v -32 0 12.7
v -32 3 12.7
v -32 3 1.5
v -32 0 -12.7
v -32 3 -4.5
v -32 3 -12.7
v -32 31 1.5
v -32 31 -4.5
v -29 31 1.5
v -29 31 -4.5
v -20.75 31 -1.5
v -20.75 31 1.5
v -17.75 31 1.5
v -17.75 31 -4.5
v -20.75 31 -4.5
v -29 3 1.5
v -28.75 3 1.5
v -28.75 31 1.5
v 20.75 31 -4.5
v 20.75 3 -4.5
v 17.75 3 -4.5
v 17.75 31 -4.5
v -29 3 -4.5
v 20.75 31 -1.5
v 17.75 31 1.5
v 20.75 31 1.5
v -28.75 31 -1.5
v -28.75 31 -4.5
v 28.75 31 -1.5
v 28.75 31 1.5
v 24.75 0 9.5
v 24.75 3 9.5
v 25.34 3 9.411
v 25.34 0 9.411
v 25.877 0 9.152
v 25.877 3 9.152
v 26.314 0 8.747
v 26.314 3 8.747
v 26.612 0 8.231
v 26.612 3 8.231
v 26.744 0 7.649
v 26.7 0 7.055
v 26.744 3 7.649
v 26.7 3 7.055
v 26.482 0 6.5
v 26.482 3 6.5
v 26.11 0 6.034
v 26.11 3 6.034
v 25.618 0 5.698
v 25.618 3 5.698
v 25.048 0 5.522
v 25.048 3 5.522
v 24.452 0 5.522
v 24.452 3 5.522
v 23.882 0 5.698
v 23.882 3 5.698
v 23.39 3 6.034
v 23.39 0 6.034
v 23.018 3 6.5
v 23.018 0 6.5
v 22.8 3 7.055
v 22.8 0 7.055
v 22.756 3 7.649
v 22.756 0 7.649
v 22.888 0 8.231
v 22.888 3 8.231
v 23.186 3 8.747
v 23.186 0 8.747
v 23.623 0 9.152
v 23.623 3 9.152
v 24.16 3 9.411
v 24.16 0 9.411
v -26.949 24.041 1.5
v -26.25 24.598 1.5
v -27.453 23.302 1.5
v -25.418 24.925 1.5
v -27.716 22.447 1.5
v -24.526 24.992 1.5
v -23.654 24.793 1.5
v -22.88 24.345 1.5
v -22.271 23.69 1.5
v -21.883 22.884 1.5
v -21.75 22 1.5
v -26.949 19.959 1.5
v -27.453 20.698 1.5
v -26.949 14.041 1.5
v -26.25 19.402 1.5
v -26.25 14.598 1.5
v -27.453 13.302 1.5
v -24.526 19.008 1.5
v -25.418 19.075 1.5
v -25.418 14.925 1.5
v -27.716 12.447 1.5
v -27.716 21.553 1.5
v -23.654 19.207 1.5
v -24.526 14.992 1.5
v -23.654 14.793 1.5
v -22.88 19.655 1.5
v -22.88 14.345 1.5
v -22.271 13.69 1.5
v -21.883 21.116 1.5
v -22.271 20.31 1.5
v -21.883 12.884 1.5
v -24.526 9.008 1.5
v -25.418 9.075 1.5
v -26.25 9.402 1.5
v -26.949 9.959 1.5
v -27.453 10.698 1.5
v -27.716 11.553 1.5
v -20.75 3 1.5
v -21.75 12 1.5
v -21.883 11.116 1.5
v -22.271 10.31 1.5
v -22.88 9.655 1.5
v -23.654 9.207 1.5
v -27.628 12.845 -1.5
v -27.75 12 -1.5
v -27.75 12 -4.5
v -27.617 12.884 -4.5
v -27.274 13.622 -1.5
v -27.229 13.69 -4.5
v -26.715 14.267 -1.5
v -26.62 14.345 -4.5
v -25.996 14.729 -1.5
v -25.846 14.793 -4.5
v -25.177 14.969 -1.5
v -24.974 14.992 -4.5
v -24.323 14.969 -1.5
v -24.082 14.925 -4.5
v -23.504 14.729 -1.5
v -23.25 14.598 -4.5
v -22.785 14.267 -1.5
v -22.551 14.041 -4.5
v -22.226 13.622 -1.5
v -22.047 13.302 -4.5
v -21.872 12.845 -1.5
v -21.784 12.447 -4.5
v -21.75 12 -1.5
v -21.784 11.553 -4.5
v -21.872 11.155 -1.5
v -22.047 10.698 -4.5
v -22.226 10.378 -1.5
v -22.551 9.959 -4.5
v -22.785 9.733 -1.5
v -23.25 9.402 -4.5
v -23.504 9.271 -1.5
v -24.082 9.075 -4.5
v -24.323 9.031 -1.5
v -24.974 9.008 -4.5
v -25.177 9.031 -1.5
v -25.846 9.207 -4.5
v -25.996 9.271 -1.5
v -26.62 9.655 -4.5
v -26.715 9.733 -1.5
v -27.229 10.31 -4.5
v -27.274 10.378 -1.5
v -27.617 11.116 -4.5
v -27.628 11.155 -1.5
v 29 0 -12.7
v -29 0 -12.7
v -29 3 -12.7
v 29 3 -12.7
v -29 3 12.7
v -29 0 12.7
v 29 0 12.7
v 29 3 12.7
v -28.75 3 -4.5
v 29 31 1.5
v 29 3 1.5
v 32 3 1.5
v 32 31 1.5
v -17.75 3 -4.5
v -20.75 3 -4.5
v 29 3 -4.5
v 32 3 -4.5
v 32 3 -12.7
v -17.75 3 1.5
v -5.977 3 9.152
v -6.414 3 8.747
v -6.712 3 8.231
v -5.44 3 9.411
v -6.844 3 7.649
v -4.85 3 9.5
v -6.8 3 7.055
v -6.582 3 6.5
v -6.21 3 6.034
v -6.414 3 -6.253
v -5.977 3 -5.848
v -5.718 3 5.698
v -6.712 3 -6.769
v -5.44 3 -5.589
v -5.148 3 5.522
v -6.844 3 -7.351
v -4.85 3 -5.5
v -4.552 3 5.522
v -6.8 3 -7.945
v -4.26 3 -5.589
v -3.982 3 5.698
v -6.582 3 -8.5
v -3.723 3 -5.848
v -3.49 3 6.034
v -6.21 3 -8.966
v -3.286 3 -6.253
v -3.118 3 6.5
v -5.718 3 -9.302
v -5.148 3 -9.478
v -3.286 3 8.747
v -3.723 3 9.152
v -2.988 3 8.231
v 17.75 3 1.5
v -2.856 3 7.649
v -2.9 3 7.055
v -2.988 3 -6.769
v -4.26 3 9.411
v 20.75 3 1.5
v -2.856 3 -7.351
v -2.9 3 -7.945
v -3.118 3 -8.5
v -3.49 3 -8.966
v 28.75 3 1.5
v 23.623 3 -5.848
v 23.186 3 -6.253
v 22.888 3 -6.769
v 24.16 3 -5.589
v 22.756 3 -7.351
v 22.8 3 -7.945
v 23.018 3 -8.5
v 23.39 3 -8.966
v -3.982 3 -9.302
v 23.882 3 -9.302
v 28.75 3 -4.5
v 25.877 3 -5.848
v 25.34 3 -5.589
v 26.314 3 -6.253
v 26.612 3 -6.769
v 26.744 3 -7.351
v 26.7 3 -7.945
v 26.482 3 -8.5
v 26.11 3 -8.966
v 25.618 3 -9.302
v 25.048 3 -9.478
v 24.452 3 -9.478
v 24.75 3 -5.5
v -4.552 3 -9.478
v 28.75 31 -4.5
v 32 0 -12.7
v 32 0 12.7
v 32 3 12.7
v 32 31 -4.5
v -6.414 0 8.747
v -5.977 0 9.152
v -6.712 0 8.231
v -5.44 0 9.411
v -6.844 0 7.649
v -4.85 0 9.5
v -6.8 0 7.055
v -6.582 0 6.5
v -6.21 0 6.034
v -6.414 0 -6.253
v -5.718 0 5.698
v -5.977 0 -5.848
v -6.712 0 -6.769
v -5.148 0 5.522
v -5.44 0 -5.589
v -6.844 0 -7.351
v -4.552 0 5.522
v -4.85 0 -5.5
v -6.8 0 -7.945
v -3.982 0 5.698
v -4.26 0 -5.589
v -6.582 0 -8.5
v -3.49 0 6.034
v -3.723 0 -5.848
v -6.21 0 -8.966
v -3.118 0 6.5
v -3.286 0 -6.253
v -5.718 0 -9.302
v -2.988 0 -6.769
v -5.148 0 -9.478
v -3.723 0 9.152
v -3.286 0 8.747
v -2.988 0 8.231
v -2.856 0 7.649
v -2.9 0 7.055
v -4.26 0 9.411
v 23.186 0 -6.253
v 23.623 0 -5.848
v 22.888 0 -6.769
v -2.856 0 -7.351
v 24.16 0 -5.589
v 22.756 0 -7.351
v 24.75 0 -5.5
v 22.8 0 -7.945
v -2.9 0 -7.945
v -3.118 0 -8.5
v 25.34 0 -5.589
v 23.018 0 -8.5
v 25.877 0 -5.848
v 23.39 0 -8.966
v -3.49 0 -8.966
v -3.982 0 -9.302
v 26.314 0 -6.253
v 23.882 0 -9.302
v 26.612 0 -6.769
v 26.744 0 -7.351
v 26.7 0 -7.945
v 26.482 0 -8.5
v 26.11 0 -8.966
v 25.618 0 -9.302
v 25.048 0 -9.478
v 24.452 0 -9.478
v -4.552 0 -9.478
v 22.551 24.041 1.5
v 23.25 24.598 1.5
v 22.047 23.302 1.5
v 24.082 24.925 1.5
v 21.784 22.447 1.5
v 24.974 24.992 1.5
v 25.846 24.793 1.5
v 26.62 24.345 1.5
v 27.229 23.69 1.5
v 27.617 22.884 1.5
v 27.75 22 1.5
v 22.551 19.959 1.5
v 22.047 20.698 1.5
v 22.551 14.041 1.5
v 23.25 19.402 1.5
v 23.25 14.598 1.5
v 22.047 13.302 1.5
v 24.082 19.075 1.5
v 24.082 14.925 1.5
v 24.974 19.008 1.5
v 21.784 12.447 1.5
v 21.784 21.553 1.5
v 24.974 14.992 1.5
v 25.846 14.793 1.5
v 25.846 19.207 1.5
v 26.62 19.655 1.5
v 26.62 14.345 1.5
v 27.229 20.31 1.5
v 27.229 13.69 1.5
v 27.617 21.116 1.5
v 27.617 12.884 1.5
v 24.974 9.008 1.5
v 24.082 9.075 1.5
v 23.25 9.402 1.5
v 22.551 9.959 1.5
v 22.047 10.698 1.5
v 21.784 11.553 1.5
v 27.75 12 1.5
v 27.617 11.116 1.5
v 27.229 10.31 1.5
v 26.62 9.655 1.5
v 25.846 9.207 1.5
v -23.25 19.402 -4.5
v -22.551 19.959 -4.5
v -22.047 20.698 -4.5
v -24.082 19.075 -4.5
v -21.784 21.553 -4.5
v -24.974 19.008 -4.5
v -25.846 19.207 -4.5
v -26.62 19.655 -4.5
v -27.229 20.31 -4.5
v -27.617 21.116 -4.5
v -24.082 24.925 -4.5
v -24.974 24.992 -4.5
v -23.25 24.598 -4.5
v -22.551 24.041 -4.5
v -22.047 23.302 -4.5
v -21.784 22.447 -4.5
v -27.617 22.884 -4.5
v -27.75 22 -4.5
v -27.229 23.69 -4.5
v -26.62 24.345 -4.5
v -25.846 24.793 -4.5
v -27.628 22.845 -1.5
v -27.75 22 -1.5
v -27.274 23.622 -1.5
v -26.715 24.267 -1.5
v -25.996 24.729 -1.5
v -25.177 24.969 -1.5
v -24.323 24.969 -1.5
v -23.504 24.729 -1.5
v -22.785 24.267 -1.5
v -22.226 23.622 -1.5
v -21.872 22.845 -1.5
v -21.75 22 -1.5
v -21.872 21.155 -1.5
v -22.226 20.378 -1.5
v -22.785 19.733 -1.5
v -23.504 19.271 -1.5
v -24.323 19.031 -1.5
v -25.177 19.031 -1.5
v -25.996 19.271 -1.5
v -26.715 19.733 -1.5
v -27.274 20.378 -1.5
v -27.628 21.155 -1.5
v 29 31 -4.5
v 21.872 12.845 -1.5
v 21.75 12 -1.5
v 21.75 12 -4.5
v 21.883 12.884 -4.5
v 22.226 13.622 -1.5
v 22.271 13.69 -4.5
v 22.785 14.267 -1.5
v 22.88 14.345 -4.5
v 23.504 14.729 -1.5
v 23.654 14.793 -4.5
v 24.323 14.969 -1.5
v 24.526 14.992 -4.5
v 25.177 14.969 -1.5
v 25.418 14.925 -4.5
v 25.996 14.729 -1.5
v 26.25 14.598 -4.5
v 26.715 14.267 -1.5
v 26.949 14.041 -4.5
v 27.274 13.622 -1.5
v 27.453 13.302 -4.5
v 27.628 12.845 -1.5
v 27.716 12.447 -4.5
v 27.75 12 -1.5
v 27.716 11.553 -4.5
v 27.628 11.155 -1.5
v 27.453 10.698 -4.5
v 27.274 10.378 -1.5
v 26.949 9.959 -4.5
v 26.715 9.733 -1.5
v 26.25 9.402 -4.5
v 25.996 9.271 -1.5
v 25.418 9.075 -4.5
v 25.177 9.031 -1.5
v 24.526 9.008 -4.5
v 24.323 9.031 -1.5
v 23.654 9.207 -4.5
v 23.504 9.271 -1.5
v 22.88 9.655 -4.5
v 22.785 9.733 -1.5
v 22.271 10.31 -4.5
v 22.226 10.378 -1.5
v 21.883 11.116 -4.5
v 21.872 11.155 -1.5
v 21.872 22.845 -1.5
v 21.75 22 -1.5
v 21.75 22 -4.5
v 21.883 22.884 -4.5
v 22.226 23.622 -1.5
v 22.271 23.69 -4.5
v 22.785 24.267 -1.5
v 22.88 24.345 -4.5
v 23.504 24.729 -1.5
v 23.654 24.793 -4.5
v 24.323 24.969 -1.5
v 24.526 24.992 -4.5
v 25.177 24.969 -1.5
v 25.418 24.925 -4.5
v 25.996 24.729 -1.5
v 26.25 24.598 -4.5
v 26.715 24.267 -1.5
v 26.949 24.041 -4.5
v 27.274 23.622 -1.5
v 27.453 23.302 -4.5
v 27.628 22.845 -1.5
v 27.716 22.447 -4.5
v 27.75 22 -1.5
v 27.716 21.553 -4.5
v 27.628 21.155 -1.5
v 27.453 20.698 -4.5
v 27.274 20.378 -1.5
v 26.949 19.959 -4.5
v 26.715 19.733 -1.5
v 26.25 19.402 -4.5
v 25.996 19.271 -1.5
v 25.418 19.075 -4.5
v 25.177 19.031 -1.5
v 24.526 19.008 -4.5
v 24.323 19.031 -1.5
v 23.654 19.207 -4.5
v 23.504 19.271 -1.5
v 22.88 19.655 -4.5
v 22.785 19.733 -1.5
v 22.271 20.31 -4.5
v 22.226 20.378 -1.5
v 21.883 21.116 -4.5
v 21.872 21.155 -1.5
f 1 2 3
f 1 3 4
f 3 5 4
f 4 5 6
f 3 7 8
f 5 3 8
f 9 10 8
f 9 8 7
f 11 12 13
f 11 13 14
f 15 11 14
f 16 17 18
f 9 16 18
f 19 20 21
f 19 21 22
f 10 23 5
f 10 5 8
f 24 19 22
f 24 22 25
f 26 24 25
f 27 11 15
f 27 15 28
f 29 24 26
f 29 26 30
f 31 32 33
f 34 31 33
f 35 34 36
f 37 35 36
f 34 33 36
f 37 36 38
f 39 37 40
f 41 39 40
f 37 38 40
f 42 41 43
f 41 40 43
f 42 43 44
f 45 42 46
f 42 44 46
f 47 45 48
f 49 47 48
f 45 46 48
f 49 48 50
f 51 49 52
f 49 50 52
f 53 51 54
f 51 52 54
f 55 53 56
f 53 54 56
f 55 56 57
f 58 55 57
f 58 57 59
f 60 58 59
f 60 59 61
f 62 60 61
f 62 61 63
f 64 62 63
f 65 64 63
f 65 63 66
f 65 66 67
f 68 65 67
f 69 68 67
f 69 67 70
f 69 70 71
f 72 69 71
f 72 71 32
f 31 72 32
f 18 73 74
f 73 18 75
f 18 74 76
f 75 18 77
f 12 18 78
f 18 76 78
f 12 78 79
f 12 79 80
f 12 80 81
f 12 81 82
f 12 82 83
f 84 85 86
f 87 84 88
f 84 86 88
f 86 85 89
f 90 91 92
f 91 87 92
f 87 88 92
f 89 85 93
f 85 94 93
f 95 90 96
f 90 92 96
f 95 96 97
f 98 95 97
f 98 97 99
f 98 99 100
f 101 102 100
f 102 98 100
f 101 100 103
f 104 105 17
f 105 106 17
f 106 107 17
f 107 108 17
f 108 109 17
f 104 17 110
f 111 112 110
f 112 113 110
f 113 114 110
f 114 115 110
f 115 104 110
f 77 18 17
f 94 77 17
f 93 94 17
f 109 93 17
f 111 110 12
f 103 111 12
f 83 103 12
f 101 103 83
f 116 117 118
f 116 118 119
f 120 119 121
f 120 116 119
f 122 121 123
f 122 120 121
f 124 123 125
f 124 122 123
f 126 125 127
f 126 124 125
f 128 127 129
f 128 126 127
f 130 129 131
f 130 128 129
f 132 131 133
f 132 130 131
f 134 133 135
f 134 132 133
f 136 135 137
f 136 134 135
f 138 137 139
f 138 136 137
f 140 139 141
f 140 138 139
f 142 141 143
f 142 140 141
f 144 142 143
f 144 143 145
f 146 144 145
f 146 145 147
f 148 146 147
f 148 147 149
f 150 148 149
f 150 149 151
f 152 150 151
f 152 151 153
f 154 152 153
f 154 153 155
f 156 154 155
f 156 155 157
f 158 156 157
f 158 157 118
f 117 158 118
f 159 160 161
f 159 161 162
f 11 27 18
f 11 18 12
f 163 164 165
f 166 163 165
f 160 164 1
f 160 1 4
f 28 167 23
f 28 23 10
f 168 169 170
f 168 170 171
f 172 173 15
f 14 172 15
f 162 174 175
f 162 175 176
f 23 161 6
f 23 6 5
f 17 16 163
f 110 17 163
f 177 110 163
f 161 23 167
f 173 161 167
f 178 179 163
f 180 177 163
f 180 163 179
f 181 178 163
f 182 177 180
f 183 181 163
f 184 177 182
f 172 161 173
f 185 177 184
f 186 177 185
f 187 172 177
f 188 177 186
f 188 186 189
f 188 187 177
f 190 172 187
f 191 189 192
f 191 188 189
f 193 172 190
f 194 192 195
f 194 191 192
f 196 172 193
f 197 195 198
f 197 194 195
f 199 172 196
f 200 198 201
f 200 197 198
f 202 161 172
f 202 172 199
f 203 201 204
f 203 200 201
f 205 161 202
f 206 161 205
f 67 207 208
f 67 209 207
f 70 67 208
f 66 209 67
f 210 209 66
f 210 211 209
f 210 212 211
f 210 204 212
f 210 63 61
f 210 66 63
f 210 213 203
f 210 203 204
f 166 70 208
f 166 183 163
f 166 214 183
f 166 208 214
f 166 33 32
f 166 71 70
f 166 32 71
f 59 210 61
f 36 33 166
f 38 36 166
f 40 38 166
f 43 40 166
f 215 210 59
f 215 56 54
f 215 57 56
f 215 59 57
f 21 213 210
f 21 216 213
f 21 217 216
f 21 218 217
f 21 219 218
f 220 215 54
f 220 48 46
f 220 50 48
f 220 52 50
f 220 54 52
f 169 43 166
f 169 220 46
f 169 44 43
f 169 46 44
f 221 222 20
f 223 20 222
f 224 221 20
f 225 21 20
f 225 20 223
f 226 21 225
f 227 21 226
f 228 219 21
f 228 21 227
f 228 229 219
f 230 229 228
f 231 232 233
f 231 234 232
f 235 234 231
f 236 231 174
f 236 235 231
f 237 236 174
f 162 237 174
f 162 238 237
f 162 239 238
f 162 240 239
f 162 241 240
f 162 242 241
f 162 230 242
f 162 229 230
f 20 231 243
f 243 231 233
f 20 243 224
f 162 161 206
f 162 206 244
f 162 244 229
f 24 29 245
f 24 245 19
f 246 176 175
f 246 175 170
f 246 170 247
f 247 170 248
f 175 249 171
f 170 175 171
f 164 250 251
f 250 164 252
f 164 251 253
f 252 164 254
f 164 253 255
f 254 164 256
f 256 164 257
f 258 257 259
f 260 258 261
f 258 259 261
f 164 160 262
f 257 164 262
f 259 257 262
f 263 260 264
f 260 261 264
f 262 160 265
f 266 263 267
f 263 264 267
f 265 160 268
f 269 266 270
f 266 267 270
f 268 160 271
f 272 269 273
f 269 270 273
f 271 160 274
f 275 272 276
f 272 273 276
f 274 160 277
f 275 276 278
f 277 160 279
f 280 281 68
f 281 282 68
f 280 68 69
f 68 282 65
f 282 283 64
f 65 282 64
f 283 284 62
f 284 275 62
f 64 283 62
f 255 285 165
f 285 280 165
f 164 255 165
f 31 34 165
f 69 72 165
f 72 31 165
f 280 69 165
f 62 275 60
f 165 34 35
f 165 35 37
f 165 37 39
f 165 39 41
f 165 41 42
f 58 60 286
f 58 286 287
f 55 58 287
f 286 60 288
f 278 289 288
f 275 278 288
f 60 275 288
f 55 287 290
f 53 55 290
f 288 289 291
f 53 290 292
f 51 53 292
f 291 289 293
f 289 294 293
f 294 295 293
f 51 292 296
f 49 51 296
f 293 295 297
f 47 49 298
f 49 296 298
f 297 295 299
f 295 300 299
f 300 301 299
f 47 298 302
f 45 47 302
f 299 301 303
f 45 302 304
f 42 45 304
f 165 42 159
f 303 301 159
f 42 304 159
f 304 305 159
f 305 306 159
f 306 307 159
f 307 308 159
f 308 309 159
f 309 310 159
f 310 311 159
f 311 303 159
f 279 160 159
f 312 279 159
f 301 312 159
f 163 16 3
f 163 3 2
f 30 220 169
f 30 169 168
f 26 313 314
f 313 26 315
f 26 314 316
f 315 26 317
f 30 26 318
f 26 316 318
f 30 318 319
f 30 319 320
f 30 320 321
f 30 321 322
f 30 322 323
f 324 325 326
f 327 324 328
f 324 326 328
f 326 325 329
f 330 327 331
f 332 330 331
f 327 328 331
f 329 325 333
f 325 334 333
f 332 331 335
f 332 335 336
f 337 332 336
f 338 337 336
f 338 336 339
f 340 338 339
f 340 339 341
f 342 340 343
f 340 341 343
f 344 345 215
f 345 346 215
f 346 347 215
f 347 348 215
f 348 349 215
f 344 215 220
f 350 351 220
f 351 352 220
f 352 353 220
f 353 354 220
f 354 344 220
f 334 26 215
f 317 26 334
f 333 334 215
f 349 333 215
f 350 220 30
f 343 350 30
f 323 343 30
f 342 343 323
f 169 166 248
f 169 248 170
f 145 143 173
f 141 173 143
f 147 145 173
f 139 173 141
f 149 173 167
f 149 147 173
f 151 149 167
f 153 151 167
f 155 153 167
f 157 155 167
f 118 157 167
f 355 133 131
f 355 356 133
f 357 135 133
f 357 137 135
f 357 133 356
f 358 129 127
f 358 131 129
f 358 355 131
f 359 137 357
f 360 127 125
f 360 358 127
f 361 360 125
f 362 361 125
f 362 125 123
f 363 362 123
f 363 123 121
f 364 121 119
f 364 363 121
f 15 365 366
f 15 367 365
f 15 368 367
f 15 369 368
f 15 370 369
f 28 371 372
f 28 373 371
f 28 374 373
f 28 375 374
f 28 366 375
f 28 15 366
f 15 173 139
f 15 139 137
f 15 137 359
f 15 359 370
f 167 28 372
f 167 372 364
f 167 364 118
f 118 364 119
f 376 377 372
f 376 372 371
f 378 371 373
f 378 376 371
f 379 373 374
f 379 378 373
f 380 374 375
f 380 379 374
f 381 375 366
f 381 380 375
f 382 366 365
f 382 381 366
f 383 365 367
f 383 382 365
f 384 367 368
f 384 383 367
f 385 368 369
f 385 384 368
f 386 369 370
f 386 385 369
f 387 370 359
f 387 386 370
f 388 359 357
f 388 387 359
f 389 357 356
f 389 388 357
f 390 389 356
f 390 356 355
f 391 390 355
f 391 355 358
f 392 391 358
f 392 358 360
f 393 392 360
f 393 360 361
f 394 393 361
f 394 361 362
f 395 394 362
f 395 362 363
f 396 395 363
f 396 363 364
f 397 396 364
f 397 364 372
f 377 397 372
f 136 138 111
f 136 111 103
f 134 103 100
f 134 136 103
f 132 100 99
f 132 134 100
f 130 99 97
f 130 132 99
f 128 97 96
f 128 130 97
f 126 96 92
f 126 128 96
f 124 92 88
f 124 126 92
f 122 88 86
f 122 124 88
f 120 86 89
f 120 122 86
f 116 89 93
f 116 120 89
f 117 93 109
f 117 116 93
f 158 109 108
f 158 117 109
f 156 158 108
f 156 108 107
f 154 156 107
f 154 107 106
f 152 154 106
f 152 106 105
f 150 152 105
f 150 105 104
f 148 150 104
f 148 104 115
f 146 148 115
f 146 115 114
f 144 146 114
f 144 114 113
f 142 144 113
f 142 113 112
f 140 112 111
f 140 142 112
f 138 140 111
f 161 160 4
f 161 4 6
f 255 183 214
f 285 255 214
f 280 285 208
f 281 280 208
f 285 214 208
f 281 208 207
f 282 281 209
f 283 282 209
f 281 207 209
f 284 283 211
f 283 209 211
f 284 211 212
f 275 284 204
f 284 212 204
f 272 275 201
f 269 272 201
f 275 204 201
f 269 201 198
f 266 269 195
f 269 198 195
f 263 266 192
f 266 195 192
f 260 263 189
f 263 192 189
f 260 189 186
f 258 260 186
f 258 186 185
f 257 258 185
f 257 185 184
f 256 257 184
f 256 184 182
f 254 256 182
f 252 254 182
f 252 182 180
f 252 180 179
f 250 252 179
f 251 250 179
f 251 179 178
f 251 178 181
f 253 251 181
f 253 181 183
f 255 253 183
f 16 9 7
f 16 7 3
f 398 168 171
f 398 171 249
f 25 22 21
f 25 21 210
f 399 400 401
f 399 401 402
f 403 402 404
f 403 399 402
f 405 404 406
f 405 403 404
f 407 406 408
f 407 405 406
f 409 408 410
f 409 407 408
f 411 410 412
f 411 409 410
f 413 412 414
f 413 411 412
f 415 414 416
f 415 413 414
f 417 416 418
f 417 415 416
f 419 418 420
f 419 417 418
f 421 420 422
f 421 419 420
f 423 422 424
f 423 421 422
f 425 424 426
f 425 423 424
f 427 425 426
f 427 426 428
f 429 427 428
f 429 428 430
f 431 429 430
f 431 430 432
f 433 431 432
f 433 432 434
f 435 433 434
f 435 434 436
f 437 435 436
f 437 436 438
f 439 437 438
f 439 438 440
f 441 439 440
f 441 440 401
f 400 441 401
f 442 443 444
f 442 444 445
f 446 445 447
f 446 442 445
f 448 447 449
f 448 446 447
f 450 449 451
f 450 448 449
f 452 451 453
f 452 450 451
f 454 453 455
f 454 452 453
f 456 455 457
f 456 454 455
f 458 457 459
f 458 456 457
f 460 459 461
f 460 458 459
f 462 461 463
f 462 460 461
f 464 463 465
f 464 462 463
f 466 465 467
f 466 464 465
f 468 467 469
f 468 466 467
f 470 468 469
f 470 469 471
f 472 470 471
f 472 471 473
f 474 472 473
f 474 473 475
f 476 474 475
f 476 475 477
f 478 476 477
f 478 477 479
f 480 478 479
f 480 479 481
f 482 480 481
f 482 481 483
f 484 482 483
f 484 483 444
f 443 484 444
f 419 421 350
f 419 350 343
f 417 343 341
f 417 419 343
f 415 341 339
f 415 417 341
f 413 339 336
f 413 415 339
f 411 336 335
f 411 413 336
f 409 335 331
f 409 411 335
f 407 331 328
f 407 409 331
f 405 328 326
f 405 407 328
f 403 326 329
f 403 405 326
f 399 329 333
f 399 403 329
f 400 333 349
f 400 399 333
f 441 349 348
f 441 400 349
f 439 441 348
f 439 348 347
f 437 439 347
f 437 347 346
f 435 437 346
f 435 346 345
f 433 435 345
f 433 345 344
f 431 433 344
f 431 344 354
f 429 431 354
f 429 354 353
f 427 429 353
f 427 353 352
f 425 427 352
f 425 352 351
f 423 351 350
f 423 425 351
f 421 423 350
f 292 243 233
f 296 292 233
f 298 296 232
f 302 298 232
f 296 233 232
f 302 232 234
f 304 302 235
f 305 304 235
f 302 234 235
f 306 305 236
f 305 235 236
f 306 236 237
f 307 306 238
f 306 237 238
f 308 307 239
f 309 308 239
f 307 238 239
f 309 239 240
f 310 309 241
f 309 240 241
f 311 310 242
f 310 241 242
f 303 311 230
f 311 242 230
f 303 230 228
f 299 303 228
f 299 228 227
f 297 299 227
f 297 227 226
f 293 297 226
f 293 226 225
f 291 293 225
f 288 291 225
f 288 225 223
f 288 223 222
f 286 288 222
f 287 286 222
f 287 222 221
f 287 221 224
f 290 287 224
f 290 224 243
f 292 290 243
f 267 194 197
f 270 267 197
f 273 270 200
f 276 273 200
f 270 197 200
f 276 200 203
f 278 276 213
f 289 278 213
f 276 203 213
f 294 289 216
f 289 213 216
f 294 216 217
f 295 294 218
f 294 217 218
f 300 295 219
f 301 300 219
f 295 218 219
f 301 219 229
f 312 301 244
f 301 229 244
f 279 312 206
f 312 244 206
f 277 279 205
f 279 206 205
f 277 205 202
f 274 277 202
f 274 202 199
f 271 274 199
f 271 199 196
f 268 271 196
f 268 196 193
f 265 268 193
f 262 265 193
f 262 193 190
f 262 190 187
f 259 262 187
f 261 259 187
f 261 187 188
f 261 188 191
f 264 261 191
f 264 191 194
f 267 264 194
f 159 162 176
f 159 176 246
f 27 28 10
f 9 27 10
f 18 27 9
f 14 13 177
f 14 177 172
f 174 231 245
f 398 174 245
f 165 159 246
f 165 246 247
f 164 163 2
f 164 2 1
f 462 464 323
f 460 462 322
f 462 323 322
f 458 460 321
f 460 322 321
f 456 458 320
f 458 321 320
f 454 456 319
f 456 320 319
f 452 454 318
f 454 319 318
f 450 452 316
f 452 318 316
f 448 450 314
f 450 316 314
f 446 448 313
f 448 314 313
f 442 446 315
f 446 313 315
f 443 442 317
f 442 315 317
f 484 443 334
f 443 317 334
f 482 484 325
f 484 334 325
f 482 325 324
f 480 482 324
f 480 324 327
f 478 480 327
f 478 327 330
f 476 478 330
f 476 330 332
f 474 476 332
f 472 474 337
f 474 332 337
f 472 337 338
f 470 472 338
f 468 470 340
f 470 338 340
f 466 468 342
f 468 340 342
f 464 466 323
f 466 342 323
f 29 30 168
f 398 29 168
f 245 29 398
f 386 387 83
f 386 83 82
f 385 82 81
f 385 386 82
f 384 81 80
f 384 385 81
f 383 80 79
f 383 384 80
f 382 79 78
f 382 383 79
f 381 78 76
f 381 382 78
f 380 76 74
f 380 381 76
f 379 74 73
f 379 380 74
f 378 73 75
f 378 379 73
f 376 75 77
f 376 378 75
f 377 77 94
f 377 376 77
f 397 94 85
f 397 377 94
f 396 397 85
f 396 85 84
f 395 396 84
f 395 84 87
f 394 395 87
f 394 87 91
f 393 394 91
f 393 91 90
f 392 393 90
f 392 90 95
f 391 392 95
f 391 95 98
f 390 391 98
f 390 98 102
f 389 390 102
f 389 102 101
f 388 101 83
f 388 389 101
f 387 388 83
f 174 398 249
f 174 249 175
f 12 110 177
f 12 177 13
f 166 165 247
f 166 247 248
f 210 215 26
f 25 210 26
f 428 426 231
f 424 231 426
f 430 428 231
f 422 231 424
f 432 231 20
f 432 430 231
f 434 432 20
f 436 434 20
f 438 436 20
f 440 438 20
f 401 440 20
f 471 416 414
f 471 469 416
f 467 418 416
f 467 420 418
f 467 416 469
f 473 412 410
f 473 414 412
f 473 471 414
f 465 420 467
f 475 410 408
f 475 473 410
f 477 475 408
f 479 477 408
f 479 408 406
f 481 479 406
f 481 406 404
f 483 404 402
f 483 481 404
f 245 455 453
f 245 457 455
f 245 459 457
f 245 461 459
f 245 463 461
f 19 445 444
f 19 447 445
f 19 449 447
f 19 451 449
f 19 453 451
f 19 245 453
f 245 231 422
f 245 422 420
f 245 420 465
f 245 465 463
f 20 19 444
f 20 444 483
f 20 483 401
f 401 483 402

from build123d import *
from build123d.topology import SkipClean

# Parameters (mm, degrees)
SKETCH_1_W          = 58
SKETCH_1_H          = 25.4
EXTRUDE_1_DEPTH     = 3
SKETCH_2_W          = 8
SKETCH_2_H          = 3
EXTRUDE_2_DEPTH     = 28
SKETCH_3_R          = 3
CUT_EXTRUDE_1_DEPTH = 12
SKETCH_4_R          = 2
CUT_EXTRUDE_2_DEPTH = 22
SKETCH_5_W          = 8
SKETCH_5_H          = 3
CUT_EXTRUDE_3_DEPTH = 28
SKETCH_6_W          = 8
SKETCH_6_H          = 28
SKETCH_6_R          = 3
EXTRUDE_3_DEPTH     = 3
SKETCH_7_W          = 6
SKETCH_7_H          = 28
EXTRUDE_4_DEPTH     = 3
SKETCH_8_W          = 6
SKETCH_8_H          = 28
EXTRUDE_5_DEPTH     = 3
SKETCH_9_W          = 6
SKETCH_9_H          = 28
EXTRUDE_6_DEPTH     = 0.25
SKETCH_10_W         = 6
SKETCH_10_H         = 28
EXTRUDE_7_DEPTH     = 0.25
EXTRUDE_8_DEPTH     = 3
EXTRUDE_9_DEPTH     = 3


with BuildPart() as part:
    # 草图1 → 凸台-拉伸1 (new body)
    with BuildSketch(Plane(origin=(0, 0, 0), x_dir=(1, 0, 0), z_dir=(0, 1, 0))):
        Rectangle(SKETCH_1_W, SKETCH_1_H)
    extrude(amount=EXTRUDE_1_DEPTH)

    # 草图2 → 凸台-拉伸2 (add)
    with BuildSketch(Plane(origin=(0, 3, 0), x_dir=(1, 0, 0), z_dir=(0, 1, 0))):
        with Locations((-24.75, 11.2)):
            Rectangle(SKETCH_2_W, SKETCH_2_H)
        with Locations((24.75, 11.2)):
            Rectangle(SKETCH_2_W, SKETCH_2_H)
        with Locations((-24.75, 0)):
            Rectangle(SKETCH_2_W, SKETCH_2_H)
        with Locations((24.75, 0)):
            Rectangle(SKETCH_2_W, SKETCH_2_H)
    extrude(amount=EXTRUDE_2_DEPTH)

    # 草图3 → 切除-拉伸1 (cut, symmetric)
    with BuildSketch(Plane.XY.offset(-9.7)):
        with Locations((-24.75, 12)):
            Circle(SKETCH_3_R)
        with Locations((-24.75, 22)):
            Circle(SKETCH_3_R)
        with Locations((24.75, 12)):
            Circle(SKETCH_3_R)
        with Locations((24.75, 22)):
            Circle(SKETCH_3_R)
    extrude(amount=CUT_EXTRUDE_1_DEPTH, both=True, mode=Mode.SUBTRACT)

    # 草图4 → 切除-拉伸2 (cut)
    with BuildSketch(Plane(origin=(0, 3, 0), x_dir=(1, 0, 0), z_dir=(0, 1, 0))):
        with Locations(Location((24.75, -7.5, 0), (0, 0, 270))):
            Circle(SKETCH_4_R)
        with Locations(Location((24.75, 7.5, 0), (0, 0, 270))):
            Circle(SKETCH_4_R)
        with Locations(Location((-4.85, 7.5, 0), (0, 0, 270))):
            Circle(SKETCH_4_R)
        with Locations(Location((-4.85, -7.5, 0), (0, 0, 270))):
            Circle(SKETCH_4_R)
    extrude(amount=-CUT_EXTRUDE_2_DEPTH, mode=Mode.SUBTRACT)

    # 草图5 → 切除-拉伸3 (cut)
    with BuildSketch(Plane(origin=(0, 31, 0), x_dir=(1, 0, 0), z_dir=(0, 1, 0))):
        with Locations((-24.75, 11.2)):
            Rectangle(SKETCH_5_W, SKETCH_5_H)
        with Locations((24.75, 11.2)):
            Rectangle(SKETCH_5_W, SKETCH_5_H)
    extrude(amount=-CUT_EXTRUDE_3_DEPTH, mode=Mode.SUBTRACT)

    # 草图6 → 凸台-拉伸3 (add)
    # profile 1 of 2: a face of its own
    with SkipClean():  # the faces are left unmerged after this step: merging them gives an invalid solid
        with BuildSketch(Plane(origin=(0, 0, -1.5), x_dir=(-1, 0, 0), z_dir=(0, 0, -1))):
            with Locations((-24.75, 17)):
                Rectangle(SKETCH_6_W, SKETCH_6_H)
            with Locations((-24.75, 22)):
                Circle(SKETCH_6_R, mode=Mode.SUBTRACT)
            with Locations((-24.75, 12)):
                Circle(SKETCH_6_R, mode=Mode.SUBTRACT)
        # profile 2 of 2: a face of its own
        with BuildSketch(Plane(origin=(0, 0, -1.5), x_dir=(-1, 0, 0), z_dir=(0, 0, -1))):
            with Locations((24.75, 17)):
                Rectangle(SKETCH_6_W, SKETCH_6_H)
            with Locations((24.75, 22)):
                Circle(SKETCH_6_R, mode=Mode.SUBTRACT)
            with Locations((24.75, 12)):
                Circle(SKETCH_6_R, mode=Mode.SUBTRACT)
        extrude(amount=EXTRUDE_3_DEPTH)

    # 草图7 → 凸台-拉伸4 (add)
    with SkipClean():  # the faces are left unmerged after this step: merging them gives an invalid solid
        with BuildSketch(Plane.ZY.offset(-20.75)):
            with Locations((-1.5, 17)):
                Rectangle(SKETCH_7_W, SKETCH_7_H)
        extrude(amount=EXTRUDE_4_DEPTH)

    # 草图8 → 凸台-拉伸5 (add)
    with SkipClean():  # the faces are left unmerged after this step: merging them gives an invalid solid
        with BuildSketch(Plane(origin=(-20.75, 0, 0), x_dir=(0, 0, -1), z_dir=(1, 0, 0))):
            with Locations((1.5, 17)):
                Rectangle(SKETCH_8_W, SKETCH_8_H)
        extrude(amount=EXTRUDE_5_DEPTH)

    # 草图9 → 凸台-拉伸6 (add)
    with SkipClean():  # the faces are left unmerged after this step: merging them gives an invalid solid
        with BuildSketch(Plane(origin=(28.75, 0, 0), x_dir=(0, 0, -1), z_dir=(1, 0, 0))):
            with Locations((1.5, 17)):
                Rectangle(SKETCH_9_W, SKETCH_9_H)
        extrude(amount=EXTRUDE_6_DEPTH)

    # 草图10 → 凸台-拉伸7 (add)
    with SkipClean():  # the faces are left unmerged after this step: merging them gives an invalid solid
        with BuildSketch(Plane.ZY.offset(28.75)):
            with Locations((-1.5, 17)):
                Rectangle(SKETCH_10_W, SKETCH_10_H)
        extrude(amount=EXTRUDE_7_DEPTH)

    # 草图11 → 凸台-拉伸8 (add)
    with SkipClean():  # the faces are left unmerged after this step: merging them gives an invalid solid
        with BuildSketch(Plane.ZY.offset(29)):
            Polygon((-4.5, 31), (1.5, 31), (1.5, 3), (12.7, 3), (12.7, 0), (-12.7, 0), (-12.7, 3), (-4.5, 3), align=None)
        extrude(amount=EXTRUDE_8_DEPTH)

    # 草图12 → 凸台-拉伸9 (add)
    with SkipClean():  # the faces are left unmerged after this step: merging them gives an invalid solid
        with BuildSketch(Plane(origin=(29, 0, 0), x_dir=(0, 0, -1), z_dir=(1, 0, 0))):
            Polygon((-1.5, 31), (4.5, 31), (4.5, 3), (12.7, 3), (12.7, 0), (-12.7, 0), (-12.7, 3), (-1.5, 3), align=None)
        extrude(amount=EXTRUDE_9_DEPTH)


solid = part.part
